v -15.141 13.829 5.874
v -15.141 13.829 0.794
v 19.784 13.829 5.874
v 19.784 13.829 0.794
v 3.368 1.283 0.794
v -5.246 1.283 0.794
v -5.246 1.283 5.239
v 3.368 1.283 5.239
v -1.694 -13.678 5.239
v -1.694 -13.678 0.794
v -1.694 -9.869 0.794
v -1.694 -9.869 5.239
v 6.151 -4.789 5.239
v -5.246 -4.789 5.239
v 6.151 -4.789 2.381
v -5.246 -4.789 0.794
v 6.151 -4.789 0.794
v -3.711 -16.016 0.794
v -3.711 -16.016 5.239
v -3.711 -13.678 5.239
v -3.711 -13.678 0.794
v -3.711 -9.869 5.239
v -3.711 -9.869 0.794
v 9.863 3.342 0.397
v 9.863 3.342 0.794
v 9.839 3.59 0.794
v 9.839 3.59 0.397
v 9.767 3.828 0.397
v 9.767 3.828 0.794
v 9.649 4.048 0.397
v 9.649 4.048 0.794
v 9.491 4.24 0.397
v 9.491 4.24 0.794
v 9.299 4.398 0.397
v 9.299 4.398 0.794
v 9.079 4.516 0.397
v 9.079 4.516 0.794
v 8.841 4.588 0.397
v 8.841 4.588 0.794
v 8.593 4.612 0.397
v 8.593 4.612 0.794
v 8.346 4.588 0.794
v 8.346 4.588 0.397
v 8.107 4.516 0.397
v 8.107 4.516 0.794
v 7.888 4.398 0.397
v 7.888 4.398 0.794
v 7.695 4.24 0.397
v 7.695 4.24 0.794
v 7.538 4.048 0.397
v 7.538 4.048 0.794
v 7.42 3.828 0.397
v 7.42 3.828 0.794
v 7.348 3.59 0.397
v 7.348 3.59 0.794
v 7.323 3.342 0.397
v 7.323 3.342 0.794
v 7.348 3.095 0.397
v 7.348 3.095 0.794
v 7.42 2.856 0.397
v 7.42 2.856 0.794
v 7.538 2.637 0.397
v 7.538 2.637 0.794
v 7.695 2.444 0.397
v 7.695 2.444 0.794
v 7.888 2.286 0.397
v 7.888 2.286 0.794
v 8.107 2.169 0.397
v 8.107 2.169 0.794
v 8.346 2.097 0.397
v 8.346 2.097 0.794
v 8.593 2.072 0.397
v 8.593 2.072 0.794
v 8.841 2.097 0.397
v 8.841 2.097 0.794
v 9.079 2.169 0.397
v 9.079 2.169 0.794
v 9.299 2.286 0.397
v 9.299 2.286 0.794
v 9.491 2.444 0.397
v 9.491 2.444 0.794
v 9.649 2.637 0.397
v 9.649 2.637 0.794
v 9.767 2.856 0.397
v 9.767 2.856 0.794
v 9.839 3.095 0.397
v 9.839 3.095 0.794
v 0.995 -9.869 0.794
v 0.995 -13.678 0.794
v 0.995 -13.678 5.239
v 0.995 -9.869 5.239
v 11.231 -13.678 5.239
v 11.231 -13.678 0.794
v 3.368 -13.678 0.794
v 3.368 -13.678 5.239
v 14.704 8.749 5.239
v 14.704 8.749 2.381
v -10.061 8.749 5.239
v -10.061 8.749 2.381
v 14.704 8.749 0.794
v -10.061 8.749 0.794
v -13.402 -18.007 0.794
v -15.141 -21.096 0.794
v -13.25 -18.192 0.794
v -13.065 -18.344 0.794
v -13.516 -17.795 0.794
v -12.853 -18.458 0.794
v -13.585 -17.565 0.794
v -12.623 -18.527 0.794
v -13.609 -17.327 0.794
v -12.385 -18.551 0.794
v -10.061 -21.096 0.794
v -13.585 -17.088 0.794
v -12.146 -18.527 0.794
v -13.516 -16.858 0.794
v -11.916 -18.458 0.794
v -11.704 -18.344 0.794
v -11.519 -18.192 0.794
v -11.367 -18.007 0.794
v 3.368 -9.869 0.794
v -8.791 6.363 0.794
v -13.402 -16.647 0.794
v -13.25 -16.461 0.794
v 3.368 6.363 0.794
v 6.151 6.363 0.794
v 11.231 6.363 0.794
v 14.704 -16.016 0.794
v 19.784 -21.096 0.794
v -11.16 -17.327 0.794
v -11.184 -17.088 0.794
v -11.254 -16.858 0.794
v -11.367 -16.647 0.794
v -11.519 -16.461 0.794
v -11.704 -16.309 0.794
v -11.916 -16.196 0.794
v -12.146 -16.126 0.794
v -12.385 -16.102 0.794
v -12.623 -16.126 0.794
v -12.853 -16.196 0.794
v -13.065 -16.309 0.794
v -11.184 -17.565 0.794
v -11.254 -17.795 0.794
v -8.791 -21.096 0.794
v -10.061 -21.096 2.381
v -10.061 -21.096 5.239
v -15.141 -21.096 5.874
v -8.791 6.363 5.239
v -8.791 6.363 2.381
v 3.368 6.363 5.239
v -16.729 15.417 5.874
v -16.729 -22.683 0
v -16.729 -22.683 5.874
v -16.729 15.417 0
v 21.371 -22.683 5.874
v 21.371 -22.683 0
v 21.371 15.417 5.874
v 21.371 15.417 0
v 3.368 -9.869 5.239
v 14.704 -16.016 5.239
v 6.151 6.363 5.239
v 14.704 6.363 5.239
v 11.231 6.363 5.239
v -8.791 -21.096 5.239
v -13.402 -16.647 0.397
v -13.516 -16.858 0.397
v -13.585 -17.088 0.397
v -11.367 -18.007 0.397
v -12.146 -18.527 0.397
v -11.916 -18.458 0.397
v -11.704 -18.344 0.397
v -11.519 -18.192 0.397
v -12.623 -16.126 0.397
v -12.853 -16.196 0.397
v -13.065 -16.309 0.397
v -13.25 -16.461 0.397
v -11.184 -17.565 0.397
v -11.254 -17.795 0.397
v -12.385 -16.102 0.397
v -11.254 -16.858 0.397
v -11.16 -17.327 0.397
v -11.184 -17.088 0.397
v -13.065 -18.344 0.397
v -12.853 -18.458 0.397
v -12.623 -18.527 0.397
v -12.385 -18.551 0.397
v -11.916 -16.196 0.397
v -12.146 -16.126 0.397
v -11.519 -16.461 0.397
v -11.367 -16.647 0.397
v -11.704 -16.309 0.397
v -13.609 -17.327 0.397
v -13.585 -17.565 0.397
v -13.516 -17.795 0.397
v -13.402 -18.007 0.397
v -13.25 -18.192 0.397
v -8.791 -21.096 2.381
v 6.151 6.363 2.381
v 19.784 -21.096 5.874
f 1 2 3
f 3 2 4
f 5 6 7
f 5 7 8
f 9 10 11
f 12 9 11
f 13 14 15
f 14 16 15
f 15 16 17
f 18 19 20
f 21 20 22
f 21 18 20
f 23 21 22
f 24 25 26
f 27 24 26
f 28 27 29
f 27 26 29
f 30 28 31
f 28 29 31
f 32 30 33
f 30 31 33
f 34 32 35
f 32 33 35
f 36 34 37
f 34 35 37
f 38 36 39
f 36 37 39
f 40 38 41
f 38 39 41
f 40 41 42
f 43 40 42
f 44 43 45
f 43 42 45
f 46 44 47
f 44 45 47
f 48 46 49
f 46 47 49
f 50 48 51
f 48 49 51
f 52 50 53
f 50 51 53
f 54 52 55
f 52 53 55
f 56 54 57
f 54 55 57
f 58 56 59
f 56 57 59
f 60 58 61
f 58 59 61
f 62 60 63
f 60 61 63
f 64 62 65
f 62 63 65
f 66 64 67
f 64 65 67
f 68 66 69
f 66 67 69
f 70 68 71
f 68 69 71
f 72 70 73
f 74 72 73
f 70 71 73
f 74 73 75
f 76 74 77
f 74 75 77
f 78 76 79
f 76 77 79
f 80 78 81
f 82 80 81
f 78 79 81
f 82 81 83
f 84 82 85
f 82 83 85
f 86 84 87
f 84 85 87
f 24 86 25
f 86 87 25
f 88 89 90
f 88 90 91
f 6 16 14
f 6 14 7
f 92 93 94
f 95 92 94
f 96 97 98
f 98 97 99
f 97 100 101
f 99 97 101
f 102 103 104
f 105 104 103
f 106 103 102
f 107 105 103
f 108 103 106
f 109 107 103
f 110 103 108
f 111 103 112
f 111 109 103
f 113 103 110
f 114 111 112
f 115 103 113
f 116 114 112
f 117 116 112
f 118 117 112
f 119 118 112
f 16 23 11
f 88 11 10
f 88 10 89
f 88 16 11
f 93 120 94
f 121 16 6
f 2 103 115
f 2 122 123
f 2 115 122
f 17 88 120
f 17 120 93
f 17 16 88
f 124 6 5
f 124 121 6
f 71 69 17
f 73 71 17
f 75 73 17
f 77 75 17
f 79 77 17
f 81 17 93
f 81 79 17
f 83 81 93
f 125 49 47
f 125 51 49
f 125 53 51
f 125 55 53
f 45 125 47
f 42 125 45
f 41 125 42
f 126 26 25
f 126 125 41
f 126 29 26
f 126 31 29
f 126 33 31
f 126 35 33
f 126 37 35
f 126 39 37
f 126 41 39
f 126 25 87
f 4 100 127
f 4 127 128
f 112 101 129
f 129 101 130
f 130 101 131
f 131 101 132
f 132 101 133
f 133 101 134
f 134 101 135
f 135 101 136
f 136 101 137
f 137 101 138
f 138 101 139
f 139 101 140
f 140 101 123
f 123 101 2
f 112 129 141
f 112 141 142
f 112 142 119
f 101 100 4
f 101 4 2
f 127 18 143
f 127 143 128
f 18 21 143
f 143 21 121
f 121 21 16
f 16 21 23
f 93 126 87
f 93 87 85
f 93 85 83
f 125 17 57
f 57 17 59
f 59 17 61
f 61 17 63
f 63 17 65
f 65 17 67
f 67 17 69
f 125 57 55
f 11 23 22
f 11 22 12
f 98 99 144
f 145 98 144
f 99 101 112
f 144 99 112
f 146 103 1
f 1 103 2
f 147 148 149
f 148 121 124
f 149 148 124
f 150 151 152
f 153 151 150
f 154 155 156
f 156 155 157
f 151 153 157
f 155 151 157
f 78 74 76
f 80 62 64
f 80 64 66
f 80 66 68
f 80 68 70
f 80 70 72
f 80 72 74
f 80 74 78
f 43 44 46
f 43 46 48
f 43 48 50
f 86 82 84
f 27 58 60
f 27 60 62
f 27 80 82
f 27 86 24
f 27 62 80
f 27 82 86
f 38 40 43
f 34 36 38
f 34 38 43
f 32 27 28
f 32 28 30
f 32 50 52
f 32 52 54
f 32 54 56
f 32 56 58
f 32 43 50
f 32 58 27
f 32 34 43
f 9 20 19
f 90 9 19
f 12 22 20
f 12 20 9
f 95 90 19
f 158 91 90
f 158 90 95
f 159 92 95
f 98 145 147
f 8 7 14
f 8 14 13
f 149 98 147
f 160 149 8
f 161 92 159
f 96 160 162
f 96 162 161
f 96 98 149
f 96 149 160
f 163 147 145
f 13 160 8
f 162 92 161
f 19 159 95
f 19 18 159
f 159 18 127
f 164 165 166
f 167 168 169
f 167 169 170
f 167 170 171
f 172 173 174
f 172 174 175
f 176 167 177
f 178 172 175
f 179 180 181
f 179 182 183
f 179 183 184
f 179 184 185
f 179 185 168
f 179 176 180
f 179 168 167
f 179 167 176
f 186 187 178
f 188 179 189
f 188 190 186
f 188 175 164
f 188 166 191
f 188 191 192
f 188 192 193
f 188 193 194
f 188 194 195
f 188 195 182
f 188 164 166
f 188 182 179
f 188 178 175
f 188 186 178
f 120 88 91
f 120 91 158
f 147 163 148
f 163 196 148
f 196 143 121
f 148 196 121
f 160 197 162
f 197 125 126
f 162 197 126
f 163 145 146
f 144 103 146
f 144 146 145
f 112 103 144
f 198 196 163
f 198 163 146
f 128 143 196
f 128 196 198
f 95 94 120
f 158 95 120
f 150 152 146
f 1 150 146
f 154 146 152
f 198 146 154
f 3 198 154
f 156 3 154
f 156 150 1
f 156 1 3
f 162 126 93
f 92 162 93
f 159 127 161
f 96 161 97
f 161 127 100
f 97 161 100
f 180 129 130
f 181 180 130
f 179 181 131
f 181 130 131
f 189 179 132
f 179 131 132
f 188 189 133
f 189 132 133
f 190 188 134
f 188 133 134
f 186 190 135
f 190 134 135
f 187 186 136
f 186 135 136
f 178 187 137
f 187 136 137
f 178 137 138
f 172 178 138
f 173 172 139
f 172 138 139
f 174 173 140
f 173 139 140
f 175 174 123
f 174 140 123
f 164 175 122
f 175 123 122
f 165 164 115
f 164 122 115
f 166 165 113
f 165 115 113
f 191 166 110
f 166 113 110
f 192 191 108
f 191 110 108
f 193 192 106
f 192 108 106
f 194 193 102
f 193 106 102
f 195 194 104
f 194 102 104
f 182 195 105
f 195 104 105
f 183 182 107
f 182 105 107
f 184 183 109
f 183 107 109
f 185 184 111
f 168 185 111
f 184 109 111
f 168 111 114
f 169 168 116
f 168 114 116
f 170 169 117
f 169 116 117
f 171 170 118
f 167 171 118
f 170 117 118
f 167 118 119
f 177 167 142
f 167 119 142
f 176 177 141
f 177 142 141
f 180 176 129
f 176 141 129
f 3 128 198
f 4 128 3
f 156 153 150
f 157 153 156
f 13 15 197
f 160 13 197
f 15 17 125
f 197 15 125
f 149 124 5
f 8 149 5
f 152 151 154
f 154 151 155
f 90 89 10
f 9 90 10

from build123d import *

# Parameters (mm, degrees)
F0_W      = 38.1
F0_H      = 38.1
F1_DEPTH  = 0.79375
F2_W      = 38.1
F2_H      = 38.1
F2_W_2    = 34.925
F2_H_2    = 34.925
F3_DEPTH  = 5.08
F6_DEPTH  = 1.5875
F7_W      = 8.6149428158
F7_H      = 6.0720914678
F7_W_2    = 2.3730299118
F7_H_2    = 3.8083838299
F7_W_3    = 2.0170976641
F8_DEPTH  = 4.445
F9_R      = 1.2241603382
F9_R_2    = 1.27
F10_DEPTH = 0.396875
F11_DEPTH = 0.2286
F12_DEPTH = 1.8161


with BuildPart() as f1:
    # F0 (on Top) → F1 (new body)
    with BuildSketch(Plane.XY):
        with Locations((2.3213718086, -3.6332369254)):
            Rectangle(F0_W, F0_H)
    extrude(amount=F1_DEPTH)

    # F2 (on face) → F3 (join)
    with BuildSketch(Plane.XY.offset(0.79375)):
        with Locations((2.3213718086, -3.6332369254)):
            Rectangle(F2_W, F2_H)
        with Locations((2.3213718086, -3.6332369254)):
            Rectangle(F2_W_2, F2_H_2, mode=Mode.SUBTRACT)
    extrude(amount=F3_DEPTH)

    # F4 (on face) → F6 (join)
    with BuildSketch(Plane.XY.offset(0.79375)):
        Polygon((-10.0611281914, 8.7492630746), (-10.0611281914, -21.0957369254), (-8.7911281914, -21.0957369254), (-8.7911281914, 6.362864282), (3.3684632859, 6.362864282), (3.3684632859, -4.7892271858), (6.1505037943, -4.7892271858), (6.1505037943, 6.362864282), (12.7729084343, 6.362864282), (14.7038718086, 6.362864282), (14.7038718086, 8.7492630746), (-8.7911281914, 8.7492630746), align=None)
    extrude(amount=F6_DEPTH)

    # F7 (on face) + F6_face (on face) → F8 (join)
    with BuildSketch(Plane.XY.offset(0.79375)):
        with Locations((-0.939008122, -1.7531814519)):
            Rectangle(F7_W, F7_H)
        Polygon((14.7038718086, -16.0157369254), (14.7038718086, 6.362864282), (11.2305037943, 6.362864282), (11.2305037943, -13.6776110157), (11.2305037943, -16.0157369254), align=None)
        Polygon((11.2305037943, -16.0157369254), (11.2305037943, -13.6776110157), (3.3684632859, -13.6776110157), (0.995433374, -13.6776110157), (-1.6940305273, -13.6776110157), (-3.7111281914, -13.6776110157), (-3.7111281914, -16.0157369254), align=None)
        with Locations((2.18194833, -11.7734191008)):
            Rectangle(F7_W_2, F7_H_2)
        with Locations((-2.7025793593, -11.7734191008)):
            Rectangle(F7_W_3, F7_H_2)
    with BuildSketch(Plane(origin=(-0.3508488173, 1.7127034678, 2.38125), x_dir=(1, 0, 0), z_dir=(0, 0, 1))):
        Polygon((15.054720626, 7.0365596068), (-9.710279374, 7.0365596068), (-9.710279374, -22.8084403932), (-8.440279374, -22.8084403932), (-8.440279374, 4.6501608142), (3.7193121032, 4.6501608142), (3.7193121032, -6.5019306536), (6.5013526117, -6.5019306536), (6.5013526117, 4.6501608142), (15.054720626, 4.6501608142), align=None)
    extrude(amount=F8_DEPTH)

    # F9 (on face) → F10 (cut)
    with BuildSketch(Plane.XY.offset(0.79375)):
        with Locations((-12.3845431954, -17.3266101629)):
            Circle(F9_R)
        with Locations((8.5934712139, 3.3424642536)):
            Circle(F9_R_2)
    extrude(amount=-F10_DEPTH, mode=Mode.SUBTRACT)

    # F11 (add): a face of the model
    f11_faces = [f1.faces().sort_by_distance(p)[0] for p in [
        (2.3213718086, 8.3614449148, 6.82625),
    ]]
    extrude(f11_faces, amount=F11_DEPTH)

    # F12 (cut, through all): a face of the model
    f12_faces = [f1.faces().sort_by_distance(p)[0] for p in [
        (2.3213718086, 8.3614449148, 7.05485),
    ]]
    extrude(f12_faces, amount=-F12_DEPTH, mode=Mode.SUBTRACT)


solid = f1.part
